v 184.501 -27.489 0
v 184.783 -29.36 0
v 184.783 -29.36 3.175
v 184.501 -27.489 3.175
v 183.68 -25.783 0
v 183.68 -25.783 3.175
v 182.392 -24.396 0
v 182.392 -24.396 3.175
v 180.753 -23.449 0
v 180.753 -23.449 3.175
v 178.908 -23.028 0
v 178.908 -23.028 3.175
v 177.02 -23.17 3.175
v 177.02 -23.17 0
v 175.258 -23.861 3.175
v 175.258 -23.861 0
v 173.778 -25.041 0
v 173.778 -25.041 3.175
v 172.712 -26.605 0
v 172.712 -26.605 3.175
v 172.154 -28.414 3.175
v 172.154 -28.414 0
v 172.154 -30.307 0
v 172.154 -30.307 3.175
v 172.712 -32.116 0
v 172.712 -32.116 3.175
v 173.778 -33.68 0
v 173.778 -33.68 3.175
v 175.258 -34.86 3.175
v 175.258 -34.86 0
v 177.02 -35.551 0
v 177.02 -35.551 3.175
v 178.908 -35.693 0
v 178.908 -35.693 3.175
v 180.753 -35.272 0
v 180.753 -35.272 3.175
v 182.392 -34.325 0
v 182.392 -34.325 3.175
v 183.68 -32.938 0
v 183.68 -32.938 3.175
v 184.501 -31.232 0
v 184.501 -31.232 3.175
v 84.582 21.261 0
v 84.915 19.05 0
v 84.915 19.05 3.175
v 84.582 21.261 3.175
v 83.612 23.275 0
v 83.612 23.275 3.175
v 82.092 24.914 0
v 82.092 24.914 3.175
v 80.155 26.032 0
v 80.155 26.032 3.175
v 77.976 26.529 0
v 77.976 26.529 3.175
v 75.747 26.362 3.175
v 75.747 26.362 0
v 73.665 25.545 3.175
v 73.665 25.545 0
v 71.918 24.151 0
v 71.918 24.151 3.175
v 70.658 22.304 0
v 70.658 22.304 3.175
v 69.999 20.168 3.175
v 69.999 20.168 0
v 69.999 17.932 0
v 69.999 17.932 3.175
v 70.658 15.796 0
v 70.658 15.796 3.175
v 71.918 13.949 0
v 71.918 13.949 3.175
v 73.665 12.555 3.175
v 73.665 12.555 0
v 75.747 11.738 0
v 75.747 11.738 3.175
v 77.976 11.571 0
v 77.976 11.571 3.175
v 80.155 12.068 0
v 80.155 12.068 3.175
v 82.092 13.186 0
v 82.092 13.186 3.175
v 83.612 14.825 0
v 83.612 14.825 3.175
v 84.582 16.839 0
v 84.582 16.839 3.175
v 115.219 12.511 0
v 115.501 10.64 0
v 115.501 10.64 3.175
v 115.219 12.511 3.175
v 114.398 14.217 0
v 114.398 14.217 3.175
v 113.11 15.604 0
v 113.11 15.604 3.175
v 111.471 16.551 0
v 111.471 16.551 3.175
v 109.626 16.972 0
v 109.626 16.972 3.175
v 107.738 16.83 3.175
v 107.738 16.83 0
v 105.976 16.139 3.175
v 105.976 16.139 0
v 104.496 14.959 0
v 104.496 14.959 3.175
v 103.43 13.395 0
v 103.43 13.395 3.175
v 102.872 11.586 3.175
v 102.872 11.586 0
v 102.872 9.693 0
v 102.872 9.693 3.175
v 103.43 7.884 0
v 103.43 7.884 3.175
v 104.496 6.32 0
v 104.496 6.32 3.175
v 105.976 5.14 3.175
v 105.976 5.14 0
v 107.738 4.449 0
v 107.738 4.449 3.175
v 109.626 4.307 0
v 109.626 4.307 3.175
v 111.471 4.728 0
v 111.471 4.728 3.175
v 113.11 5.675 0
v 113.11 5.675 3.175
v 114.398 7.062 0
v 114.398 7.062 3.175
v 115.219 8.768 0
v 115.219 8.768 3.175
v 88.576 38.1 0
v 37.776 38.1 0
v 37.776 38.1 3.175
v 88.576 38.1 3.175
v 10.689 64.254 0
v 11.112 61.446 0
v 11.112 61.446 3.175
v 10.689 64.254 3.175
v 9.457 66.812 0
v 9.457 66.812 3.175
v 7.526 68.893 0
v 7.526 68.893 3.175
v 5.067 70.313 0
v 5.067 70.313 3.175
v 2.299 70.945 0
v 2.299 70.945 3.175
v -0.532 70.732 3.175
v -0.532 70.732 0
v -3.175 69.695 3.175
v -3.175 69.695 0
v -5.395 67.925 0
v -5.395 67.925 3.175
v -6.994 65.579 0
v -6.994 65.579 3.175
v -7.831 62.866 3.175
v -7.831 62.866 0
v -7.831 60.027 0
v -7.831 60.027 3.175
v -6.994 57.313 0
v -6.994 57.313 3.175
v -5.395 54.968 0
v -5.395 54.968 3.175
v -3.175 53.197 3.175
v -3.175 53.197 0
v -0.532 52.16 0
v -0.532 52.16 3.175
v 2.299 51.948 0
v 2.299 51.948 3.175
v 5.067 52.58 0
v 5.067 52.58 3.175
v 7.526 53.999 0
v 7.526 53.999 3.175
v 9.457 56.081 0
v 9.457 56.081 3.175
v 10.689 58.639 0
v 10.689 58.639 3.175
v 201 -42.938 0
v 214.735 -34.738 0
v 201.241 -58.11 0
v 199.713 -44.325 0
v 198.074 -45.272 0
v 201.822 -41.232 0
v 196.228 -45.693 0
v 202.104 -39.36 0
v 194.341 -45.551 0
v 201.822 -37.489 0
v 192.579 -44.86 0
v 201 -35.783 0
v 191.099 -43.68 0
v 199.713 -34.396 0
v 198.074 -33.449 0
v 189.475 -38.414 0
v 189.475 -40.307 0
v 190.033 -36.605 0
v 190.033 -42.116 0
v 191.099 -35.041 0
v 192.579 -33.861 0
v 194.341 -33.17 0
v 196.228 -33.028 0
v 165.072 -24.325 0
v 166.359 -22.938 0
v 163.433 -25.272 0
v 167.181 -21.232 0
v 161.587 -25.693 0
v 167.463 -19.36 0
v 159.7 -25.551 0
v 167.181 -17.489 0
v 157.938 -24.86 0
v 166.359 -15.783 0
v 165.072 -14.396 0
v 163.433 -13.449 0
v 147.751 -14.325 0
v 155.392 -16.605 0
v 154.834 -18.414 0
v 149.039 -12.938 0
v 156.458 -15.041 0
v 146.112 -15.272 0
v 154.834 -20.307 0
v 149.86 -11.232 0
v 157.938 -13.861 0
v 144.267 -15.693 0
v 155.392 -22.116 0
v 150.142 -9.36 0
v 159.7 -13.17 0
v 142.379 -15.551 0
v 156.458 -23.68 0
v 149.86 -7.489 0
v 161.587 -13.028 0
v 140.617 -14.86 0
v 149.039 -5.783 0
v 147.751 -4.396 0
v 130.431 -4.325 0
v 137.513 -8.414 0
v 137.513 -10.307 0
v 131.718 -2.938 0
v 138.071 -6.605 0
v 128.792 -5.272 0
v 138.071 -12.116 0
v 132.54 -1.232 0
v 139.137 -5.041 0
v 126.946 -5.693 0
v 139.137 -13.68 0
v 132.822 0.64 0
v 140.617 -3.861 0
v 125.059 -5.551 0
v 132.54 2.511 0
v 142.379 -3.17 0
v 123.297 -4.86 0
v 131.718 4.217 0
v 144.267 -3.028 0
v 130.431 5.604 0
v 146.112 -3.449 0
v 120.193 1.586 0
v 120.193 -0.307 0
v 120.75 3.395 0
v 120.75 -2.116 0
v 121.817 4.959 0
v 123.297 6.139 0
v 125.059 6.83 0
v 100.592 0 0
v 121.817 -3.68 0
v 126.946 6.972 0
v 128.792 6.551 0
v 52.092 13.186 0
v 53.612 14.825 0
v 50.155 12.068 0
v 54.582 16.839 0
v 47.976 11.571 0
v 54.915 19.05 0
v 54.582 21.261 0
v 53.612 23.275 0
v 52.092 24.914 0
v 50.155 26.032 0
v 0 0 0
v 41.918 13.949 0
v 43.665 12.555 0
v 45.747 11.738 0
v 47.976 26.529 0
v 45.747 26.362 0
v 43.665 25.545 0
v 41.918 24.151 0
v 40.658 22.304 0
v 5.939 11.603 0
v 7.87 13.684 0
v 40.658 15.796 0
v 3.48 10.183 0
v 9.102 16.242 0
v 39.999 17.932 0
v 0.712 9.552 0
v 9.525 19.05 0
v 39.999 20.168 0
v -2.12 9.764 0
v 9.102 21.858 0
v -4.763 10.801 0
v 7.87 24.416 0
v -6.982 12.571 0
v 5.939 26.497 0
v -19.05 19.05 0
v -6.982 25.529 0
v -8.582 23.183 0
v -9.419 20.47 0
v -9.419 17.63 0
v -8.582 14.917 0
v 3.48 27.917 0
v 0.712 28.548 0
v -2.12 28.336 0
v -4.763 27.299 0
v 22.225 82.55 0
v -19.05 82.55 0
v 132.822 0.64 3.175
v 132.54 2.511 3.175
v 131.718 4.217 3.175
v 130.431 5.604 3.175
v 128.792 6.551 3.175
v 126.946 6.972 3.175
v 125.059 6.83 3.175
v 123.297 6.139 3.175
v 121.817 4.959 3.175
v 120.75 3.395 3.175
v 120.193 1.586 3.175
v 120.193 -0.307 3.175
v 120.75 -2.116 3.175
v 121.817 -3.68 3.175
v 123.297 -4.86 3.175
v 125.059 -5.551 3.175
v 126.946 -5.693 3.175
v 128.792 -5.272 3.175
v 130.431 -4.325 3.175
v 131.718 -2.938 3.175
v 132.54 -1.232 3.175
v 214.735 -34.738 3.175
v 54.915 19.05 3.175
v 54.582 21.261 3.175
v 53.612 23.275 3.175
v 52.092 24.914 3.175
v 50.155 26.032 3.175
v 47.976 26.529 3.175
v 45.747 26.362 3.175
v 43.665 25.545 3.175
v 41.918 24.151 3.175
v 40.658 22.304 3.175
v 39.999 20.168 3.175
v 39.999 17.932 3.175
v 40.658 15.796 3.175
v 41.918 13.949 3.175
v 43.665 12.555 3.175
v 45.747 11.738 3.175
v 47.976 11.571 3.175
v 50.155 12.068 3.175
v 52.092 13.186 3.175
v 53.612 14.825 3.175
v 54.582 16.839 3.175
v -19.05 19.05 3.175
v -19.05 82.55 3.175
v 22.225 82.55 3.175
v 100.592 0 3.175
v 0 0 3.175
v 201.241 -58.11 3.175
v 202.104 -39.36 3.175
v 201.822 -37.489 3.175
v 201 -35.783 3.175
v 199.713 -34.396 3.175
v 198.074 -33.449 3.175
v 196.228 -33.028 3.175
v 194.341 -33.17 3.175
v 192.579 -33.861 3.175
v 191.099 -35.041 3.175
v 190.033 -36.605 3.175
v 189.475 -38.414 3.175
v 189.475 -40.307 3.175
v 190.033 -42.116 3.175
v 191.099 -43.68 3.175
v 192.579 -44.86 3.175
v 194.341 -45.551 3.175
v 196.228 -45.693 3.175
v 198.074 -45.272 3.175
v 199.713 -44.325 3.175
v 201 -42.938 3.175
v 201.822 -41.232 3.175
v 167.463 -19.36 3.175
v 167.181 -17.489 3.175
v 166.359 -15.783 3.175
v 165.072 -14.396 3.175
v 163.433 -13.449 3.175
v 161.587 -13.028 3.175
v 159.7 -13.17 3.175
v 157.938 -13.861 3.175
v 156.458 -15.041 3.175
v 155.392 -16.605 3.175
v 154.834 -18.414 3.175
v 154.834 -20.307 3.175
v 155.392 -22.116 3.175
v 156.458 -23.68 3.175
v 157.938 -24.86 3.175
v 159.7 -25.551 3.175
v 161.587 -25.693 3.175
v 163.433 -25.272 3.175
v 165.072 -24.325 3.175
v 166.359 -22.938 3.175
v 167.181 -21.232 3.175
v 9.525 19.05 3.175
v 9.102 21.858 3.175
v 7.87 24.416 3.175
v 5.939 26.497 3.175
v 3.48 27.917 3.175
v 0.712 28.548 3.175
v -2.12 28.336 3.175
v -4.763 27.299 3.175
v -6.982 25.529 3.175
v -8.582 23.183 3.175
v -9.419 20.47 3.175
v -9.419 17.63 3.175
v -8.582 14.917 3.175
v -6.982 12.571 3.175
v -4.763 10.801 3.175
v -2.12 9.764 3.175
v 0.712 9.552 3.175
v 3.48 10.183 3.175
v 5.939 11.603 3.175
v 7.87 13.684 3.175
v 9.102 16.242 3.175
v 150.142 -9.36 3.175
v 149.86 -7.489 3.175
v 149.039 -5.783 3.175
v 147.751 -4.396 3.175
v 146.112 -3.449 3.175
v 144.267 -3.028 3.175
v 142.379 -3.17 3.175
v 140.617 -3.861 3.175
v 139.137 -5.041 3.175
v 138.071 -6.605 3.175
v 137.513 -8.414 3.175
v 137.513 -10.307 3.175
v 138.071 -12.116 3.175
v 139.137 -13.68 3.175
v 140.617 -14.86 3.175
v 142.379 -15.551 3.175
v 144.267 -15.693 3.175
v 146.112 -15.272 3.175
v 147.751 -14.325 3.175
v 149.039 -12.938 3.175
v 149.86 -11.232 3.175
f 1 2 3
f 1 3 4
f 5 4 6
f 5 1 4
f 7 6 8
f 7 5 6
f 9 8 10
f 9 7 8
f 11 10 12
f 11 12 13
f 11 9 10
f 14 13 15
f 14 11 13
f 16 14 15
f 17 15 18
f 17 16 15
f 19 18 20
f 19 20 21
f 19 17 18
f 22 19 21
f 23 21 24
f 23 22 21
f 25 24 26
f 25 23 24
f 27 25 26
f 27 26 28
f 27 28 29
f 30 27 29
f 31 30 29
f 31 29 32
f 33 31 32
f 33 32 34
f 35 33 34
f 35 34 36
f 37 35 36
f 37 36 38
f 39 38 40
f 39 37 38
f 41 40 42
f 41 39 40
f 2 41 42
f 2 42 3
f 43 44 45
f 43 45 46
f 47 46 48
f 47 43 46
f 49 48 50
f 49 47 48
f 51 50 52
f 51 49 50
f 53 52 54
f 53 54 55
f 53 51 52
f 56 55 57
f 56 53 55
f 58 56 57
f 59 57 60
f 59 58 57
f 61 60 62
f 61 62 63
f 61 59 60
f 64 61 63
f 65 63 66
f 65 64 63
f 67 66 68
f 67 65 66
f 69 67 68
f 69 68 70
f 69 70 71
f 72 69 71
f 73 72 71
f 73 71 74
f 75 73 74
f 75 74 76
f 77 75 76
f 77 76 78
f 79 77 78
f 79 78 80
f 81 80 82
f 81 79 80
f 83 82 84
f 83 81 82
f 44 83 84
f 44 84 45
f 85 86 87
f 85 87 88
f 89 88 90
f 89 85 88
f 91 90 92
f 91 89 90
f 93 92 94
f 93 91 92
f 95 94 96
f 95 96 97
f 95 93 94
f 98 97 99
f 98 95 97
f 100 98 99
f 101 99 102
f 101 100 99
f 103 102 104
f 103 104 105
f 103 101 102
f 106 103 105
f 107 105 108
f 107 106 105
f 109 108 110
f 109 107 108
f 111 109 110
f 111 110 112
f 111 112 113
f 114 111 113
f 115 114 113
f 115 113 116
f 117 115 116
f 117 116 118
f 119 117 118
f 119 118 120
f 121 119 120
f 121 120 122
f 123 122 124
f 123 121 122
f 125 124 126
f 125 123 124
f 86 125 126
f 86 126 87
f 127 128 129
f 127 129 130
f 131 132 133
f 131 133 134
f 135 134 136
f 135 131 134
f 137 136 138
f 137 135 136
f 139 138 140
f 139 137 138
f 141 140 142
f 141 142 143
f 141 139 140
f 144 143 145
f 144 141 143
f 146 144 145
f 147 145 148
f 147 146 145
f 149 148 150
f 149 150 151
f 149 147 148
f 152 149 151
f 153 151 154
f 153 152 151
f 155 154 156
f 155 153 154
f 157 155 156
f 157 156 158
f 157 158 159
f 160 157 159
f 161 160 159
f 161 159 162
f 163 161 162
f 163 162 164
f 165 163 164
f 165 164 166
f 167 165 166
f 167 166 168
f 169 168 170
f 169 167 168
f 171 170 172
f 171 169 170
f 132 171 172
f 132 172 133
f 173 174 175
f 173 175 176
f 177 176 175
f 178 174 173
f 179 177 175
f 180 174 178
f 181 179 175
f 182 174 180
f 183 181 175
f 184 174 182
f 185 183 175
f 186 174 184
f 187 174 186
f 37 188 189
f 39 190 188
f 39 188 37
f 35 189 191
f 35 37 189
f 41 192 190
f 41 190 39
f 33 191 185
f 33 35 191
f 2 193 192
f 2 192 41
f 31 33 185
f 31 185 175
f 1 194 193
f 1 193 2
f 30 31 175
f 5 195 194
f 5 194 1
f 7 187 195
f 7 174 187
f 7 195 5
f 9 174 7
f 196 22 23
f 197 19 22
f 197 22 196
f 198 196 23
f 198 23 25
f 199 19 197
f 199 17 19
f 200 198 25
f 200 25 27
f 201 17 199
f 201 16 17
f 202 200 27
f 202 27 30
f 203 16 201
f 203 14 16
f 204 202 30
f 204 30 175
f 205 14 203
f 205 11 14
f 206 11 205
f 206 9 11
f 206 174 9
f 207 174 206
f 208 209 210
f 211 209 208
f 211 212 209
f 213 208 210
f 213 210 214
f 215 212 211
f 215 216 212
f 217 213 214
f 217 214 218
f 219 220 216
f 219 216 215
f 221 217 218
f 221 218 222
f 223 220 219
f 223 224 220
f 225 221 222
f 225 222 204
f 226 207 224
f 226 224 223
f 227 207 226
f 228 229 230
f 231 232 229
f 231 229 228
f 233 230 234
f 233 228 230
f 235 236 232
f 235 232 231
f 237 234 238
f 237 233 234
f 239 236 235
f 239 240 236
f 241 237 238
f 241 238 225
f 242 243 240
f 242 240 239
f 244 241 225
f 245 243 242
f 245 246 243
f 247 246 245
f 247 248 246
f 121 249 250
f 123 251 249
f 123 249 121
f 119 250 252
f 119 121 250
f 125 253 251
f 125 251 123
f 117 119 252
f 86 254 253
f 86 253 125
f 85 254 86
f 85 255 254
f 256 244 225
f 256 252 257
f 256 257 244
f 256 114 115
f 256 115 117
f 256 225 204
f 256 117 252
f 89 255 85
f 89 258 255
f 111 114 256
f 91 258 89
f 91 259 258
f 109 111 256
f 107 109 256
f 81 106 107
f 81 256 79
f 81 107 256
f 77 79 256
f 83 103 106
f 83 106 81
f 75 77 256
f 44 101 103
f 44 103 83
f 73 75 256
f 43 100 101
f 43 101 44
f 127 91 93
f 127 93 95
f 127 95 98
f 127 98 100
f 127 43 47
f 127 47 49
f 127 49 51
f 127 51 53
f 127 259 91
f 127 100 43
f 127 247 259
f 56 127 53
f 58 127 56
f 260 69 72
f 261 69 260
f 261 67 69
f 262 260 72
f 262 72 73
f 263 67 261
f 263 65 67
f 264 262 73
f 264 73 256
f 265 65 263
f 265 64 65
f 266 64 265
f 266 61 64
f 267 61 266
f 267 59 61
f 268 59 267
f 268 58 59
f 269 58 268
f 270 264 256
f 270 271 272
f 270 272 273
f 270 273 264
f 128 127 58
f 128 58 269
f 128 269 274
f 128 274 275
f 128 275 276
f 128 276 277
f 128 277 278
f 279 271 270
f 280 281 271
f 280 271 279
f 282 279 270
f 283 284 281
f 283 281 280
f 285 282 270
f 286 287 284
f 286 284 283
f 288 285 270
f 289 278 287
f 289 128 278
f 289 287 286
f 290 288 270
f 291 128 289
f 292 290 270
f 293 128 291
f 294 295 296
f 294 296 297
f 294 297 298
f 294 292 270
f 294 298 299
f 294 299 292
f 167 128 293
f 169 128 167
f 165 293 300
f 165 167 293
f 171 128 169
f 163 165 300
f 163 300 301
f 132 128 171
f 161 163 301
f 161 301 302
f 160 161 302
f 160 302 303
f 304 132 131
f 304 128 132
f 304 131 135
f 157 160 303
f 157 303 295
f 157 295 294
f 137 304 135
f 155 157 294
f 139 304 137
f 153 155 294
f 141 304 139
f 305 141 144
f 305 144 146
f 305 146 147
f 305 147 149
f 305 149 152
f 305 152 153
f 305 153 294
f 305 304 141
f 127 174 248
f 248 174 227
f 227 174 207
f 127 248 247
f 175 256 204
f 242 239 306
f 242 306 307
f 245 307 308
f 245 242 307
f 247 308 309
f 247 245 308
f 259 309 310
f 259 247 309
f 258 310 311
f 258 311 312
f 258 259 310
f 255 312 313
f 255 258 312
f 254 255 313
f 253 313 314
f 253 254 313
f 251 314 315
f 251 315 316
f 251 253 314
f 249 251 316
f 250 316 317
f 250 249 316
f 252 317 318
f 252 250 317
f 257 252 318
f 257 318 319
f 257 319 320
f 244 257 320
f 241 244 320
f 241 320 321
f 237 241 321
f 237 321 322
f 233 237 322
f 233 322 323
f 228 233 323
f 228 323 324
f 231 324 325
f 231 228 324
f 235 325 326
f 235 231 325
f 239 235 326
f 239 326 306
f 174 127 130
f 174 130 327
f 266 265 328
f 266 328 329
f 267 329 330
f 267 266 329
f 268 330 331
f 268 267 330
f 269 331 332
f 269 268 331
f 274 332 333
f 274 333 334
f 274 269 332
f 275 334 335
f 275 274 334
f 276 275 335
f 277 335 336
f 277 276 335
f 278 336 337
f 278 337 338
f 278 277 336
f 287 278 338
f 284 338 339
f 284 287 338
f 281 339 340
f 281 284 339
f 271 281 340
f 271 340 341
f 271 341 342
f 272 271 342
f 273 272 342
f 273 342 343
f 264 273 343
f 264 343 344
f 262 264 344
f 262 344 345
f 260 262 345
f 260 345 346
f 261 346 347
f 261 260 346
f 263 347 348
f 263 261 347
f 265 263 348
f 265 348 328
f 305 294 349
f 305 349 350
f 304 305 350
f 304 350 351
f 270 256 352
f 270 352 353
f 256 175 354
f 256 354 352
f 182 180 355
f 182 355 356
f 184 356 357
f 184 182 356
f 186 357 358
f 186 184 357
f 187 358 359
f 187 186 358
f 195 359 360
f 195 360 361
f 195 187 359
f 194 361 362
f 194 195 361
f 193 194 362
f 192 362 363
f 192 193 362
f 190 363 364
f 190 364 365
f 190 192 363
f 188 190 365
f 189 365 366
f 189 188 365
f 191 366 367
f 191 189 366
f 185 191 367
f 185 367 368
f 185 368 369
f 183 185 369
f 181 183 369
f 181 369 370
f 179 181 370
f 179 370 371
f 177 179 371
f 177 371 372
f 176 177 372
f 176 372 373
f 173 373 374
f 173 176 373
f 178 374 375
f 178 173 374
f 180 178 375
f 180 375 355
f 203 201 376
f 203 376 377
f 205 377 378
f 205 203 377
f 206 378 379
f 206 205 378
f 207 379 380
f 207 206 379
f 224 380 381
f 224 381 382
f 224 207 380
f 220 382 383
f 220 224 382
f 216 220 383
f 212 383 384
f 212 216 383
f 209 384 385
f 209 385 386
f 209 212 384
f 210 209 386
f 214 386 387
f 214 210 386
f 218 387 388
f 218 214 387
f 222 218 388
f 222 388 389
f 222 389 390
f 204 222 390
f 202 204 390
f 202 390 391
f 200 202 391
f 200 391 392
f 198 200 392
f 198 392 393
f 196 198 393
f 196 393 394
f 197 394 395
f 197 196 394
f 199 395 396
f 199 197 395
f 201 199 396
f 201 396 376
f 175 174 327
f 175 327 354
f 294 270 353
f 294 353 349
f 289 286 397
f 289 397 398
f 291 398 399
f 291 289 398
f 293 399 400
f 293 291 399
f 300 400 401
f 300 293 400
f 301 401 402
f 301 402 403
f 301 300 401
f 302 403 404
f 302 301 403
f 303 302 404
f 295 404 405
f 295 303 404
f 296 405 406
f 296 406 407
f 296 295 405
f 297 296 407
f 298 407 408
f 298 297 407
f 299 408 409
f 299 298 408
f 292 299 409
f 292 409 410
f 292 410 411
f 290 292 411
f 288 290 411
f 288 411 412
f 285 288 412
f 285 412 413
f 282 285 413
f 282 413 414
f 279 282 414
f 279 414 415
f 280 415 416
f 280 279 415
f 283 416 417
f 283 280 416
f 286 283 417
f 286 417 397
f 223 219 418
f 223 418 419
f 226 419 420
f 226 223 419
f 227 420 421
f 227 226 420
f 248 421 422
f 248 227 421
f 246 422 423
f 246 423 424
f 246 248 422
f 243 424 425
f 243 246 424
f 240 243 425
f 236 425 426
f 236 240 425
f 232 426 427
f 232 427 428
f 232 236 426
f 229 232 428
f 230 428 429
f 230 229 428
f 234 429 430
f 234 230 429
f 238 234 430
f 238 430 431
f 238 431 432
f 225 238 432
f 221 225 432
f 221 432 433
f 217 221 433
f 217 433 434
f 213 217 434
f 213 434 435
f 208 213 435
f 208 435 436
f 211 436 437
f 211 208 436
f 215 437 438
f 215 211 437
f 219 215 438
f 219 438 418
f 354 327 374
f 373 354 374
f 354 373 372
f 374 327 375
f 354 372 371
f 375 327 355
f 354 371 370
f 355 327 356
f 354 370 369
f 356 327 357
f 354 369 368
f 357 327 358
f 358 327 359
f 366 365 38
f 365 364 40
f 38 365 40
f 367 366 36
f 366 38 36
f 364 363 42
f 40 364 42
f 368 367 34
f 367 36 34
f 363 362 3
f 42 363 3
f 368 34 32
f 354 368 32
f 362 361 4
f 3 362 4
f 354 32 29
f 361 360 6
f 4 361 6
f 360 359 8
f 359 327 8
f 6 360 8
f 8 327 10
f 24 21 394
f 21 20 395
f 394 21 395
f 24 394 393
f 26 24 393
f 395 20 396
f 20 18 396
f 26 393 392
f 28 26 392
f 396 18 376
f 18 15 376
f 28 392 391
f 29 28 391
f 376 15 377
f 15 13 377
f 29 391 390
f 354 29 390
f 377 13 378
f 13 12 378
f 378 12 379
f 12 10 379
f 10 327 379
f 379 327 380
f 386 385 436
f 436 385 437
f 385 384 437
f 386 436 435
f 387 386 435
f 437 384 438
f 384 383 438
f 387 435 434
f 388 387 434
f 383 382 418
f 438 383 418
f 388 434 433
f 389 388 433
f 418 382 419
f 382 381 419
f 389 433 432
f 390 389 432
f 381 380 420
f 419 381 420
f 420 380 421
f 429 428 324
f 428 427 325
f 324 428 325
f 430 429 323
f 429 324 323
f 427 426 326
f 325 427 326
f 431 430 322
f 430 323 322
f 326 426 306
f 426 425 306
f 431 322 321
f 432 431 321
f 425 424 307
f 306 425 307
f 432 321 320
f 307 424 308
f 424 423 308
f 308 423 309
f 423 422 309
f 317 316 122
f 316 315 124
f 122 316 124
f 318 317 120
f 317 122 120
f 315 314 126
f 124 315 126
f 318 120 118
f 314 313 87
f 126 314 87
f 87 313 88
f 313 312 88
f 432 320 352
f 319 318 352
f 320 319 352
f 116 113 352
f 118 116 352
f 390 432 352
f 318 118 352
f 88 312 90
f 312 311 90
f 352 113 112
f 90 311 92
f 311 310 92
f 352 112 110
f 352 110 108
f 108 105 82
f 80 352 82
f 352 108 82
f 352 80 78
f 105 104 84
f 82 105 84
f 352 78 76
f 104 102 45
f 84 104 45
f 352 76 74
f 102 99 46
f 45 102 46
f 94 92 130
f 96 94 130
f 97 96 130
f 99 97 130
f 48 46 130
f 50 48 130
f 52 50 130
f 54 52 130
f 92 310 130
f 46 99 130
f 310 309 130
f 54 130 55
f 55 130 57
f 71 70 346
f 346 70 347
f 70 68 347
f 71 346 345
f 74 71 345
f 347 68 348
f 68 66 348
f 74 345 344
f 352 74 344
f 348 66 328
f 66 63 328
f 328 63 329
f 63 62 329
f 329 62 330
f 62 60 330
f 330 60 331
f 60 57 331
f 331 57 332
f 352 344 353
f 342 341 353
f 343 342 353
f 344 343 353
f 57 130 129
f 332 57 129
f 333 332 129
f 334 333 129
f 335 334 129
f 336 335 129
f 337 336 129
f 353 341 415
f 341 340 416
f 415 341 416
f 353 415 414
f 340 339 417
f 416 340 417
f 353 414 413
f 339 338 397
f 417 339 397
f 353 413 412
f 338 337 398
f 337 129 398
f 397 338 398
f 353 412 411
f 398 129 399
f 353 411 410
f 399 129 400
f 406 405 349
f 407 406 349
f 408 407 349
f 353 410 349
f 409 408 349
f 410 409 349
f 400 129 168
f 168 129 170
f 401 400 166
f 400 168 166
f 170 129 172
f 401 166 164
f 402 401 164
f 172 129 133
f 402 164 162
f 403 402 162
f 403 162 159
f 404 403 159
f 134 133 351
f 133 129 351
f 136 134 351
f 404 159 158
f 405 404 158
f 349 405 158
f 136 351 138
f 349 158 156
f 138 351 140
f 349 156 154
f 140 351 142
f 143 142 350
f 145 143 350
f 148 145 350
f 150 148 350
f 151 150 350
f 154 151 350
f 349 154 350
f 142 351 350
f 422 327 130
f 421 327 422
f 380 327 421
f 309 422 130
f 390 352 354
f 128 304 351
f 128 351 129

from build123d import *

# Parameters (mm, degrees)
SKETCH2_R           = 6.35
SKETCH2_R_2         = 7.5
SKETCH2_R_3         = 9.525
BOSS_EXTRUDE1_DEPTH = 3.175


with BuildPart() as part:
    # Sketch2 → Boss-Extrude1 (new body)
    with BuildSketch(Plane.XY):
        Polygon((-19.05, 82.55), (22.225, 82.55), (37.775682613, 38.1), (88.575682613, 38.1), (214.73506591, -34.738153907), (201.24131591, -58.110014492), (100.591818382, 0), (0, 0), (-19.05, 19.05), align=None)
        with Locations((109.151133068, 10.639517751)):
            Circle(SKETCH2_R, mode=Mode.SUBTRACT)
        with Locations((126.471641144, 0.639517751)):
            Circle(SKETCH2_R, mode=Mode.SUBTRACT)
        with Locations((143.79214922, -9.360482249)):
            Circle(SKETCH2_R, mode=Mode.SUBTRACT)
        with Locations((161.112657295, -19.360482249)):
            Circle(SKETCH2_R, mode=Mode.SUBTRACT)
        with Locations((178.433165371, -29.360482249)):
            Circle(SKETCH2_R, mode=Mode.SUBTRACT)
        with Locations((195.753673447, -39.360482249)):
            Circle(SKETCH2_R, mode=Mode.SUBTRACT)
        with Locations((47.415438379, 19.05)):
            Circle(SKETCH2_R_2, mode=Mode.SUBTRACT)
        with Locations((77.415438379, 19.05)):
            Circle(SKETCH2_R_2, mode=Mode.SUBTRACT)
        with Locations((0, 19.05)):
            Circle(SKETCH2_R_3, mode=Mode.SUBTRACT)
        with Locations((1.5875, 61.446195183)):
            Circle(SKETCH2_R_3, mode=Mode.SUBTRACT)
    extrude(amount=BOSS_EXTRUDE1_DEPTH)


solid = part.part
